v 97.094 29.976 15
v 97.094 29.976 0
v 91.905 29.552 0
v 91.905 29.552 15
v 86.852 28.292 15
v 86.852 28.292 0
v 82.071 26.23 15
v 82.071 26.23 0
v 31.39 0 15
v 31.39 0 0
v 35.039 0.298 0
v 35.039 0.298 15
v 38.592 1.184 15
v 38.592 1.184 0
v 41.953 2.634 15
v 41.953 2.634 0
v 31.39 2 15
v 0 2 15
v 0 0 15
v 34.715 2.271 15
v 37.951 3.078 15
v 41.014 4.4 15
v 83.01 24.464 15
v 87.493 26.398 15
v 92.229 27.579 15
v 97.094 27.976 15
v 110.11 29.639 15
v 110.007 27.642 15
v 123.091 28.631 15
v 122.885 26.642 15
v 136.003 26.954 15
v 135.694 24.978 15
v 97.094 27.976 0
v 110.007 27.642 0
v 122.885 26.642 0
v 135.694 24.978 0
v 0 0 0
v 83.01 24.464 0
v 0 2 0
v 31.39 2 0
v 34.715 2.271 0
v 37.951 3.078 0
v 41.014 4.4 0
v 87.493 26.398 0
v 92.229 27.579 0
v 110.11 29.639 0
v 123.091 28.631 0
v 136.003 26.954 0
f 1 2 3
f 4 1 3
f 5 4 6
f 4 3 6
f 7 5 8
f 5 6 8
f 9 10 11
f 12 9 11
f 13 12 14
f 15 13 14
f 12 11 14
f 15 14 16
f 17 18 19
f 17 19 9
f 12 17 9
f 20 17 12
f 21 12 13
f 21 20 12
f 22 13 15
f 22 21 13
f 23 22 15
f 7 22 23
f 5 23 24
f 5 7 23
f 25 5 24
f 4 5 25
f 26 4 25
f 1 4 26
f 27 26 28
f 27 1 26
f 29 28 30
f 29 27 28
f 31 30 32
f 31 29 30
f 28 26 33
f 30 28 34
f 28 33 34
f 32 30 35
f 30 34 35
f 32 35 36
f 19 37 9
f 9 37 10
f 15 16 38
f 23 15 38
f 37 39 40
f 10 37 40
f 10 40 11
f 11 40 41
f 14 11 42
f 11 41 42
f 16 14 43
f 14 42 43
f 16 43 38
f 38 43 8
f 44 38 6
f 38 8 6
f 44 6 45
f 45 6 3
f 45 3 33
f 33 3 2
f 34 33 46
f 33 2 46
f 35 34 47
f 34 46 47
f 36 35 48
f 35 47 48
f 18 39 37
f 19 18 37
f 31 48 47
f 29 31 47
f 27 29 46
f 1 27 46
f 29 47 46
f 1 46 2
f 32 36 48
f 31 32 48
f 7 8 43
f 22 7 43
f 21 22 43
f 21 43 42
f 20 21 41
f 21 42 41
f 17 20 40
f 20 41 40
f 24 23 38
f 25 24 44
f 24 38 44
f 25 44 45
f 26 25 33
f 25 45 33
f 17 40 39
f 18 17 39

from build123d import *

# Parameters (mm, degrees)
F1_DEPTH = 15


with BuildPart() as f1:
    # F0 (on Top) → F1 (new body)
    with BuildSketch(Plane.XY):
        with BuildLine():
            Line((0, 2), (0, 0))
            Line((0, 0), (31.39012, 0))
            ThreePointArc((31.39012, 0), (36.833363, 0.668346), (41.95323, 2.633679))
            Line((41.95323, 2.633679), (83.010293, 24.464107))
            ThreePointArc((83.010293, 24.464107), (89.836783, 27.084551), (97.09444, 27.975679))
            ThreePointArc((97.09444, 27.975679), (116.452329, 27.225097), (135.693981, 24.977856))
            Line((135.693981, 24.977856), (136.002777, 26.953874))
            ThreePointArc((136.002777, 26.953874), (116.607192, 29.219092), (97.09444, 29.975679))
            ThreePointArc((97.09444, 29.975679), (89.352939, 29.025142), (82.07135, 26.230002))
            Line((82.07135, 26.230002), (41.014287, 4.399574))
            ThreePointArc((41.014287, 4.399574), (36.349519, 2.608938), (31.39012, 2))
            Line((31.39012, 2), (0, 2))
        make_face()
    extrude(amount=F1_DEPTH)


solid = f1.part
